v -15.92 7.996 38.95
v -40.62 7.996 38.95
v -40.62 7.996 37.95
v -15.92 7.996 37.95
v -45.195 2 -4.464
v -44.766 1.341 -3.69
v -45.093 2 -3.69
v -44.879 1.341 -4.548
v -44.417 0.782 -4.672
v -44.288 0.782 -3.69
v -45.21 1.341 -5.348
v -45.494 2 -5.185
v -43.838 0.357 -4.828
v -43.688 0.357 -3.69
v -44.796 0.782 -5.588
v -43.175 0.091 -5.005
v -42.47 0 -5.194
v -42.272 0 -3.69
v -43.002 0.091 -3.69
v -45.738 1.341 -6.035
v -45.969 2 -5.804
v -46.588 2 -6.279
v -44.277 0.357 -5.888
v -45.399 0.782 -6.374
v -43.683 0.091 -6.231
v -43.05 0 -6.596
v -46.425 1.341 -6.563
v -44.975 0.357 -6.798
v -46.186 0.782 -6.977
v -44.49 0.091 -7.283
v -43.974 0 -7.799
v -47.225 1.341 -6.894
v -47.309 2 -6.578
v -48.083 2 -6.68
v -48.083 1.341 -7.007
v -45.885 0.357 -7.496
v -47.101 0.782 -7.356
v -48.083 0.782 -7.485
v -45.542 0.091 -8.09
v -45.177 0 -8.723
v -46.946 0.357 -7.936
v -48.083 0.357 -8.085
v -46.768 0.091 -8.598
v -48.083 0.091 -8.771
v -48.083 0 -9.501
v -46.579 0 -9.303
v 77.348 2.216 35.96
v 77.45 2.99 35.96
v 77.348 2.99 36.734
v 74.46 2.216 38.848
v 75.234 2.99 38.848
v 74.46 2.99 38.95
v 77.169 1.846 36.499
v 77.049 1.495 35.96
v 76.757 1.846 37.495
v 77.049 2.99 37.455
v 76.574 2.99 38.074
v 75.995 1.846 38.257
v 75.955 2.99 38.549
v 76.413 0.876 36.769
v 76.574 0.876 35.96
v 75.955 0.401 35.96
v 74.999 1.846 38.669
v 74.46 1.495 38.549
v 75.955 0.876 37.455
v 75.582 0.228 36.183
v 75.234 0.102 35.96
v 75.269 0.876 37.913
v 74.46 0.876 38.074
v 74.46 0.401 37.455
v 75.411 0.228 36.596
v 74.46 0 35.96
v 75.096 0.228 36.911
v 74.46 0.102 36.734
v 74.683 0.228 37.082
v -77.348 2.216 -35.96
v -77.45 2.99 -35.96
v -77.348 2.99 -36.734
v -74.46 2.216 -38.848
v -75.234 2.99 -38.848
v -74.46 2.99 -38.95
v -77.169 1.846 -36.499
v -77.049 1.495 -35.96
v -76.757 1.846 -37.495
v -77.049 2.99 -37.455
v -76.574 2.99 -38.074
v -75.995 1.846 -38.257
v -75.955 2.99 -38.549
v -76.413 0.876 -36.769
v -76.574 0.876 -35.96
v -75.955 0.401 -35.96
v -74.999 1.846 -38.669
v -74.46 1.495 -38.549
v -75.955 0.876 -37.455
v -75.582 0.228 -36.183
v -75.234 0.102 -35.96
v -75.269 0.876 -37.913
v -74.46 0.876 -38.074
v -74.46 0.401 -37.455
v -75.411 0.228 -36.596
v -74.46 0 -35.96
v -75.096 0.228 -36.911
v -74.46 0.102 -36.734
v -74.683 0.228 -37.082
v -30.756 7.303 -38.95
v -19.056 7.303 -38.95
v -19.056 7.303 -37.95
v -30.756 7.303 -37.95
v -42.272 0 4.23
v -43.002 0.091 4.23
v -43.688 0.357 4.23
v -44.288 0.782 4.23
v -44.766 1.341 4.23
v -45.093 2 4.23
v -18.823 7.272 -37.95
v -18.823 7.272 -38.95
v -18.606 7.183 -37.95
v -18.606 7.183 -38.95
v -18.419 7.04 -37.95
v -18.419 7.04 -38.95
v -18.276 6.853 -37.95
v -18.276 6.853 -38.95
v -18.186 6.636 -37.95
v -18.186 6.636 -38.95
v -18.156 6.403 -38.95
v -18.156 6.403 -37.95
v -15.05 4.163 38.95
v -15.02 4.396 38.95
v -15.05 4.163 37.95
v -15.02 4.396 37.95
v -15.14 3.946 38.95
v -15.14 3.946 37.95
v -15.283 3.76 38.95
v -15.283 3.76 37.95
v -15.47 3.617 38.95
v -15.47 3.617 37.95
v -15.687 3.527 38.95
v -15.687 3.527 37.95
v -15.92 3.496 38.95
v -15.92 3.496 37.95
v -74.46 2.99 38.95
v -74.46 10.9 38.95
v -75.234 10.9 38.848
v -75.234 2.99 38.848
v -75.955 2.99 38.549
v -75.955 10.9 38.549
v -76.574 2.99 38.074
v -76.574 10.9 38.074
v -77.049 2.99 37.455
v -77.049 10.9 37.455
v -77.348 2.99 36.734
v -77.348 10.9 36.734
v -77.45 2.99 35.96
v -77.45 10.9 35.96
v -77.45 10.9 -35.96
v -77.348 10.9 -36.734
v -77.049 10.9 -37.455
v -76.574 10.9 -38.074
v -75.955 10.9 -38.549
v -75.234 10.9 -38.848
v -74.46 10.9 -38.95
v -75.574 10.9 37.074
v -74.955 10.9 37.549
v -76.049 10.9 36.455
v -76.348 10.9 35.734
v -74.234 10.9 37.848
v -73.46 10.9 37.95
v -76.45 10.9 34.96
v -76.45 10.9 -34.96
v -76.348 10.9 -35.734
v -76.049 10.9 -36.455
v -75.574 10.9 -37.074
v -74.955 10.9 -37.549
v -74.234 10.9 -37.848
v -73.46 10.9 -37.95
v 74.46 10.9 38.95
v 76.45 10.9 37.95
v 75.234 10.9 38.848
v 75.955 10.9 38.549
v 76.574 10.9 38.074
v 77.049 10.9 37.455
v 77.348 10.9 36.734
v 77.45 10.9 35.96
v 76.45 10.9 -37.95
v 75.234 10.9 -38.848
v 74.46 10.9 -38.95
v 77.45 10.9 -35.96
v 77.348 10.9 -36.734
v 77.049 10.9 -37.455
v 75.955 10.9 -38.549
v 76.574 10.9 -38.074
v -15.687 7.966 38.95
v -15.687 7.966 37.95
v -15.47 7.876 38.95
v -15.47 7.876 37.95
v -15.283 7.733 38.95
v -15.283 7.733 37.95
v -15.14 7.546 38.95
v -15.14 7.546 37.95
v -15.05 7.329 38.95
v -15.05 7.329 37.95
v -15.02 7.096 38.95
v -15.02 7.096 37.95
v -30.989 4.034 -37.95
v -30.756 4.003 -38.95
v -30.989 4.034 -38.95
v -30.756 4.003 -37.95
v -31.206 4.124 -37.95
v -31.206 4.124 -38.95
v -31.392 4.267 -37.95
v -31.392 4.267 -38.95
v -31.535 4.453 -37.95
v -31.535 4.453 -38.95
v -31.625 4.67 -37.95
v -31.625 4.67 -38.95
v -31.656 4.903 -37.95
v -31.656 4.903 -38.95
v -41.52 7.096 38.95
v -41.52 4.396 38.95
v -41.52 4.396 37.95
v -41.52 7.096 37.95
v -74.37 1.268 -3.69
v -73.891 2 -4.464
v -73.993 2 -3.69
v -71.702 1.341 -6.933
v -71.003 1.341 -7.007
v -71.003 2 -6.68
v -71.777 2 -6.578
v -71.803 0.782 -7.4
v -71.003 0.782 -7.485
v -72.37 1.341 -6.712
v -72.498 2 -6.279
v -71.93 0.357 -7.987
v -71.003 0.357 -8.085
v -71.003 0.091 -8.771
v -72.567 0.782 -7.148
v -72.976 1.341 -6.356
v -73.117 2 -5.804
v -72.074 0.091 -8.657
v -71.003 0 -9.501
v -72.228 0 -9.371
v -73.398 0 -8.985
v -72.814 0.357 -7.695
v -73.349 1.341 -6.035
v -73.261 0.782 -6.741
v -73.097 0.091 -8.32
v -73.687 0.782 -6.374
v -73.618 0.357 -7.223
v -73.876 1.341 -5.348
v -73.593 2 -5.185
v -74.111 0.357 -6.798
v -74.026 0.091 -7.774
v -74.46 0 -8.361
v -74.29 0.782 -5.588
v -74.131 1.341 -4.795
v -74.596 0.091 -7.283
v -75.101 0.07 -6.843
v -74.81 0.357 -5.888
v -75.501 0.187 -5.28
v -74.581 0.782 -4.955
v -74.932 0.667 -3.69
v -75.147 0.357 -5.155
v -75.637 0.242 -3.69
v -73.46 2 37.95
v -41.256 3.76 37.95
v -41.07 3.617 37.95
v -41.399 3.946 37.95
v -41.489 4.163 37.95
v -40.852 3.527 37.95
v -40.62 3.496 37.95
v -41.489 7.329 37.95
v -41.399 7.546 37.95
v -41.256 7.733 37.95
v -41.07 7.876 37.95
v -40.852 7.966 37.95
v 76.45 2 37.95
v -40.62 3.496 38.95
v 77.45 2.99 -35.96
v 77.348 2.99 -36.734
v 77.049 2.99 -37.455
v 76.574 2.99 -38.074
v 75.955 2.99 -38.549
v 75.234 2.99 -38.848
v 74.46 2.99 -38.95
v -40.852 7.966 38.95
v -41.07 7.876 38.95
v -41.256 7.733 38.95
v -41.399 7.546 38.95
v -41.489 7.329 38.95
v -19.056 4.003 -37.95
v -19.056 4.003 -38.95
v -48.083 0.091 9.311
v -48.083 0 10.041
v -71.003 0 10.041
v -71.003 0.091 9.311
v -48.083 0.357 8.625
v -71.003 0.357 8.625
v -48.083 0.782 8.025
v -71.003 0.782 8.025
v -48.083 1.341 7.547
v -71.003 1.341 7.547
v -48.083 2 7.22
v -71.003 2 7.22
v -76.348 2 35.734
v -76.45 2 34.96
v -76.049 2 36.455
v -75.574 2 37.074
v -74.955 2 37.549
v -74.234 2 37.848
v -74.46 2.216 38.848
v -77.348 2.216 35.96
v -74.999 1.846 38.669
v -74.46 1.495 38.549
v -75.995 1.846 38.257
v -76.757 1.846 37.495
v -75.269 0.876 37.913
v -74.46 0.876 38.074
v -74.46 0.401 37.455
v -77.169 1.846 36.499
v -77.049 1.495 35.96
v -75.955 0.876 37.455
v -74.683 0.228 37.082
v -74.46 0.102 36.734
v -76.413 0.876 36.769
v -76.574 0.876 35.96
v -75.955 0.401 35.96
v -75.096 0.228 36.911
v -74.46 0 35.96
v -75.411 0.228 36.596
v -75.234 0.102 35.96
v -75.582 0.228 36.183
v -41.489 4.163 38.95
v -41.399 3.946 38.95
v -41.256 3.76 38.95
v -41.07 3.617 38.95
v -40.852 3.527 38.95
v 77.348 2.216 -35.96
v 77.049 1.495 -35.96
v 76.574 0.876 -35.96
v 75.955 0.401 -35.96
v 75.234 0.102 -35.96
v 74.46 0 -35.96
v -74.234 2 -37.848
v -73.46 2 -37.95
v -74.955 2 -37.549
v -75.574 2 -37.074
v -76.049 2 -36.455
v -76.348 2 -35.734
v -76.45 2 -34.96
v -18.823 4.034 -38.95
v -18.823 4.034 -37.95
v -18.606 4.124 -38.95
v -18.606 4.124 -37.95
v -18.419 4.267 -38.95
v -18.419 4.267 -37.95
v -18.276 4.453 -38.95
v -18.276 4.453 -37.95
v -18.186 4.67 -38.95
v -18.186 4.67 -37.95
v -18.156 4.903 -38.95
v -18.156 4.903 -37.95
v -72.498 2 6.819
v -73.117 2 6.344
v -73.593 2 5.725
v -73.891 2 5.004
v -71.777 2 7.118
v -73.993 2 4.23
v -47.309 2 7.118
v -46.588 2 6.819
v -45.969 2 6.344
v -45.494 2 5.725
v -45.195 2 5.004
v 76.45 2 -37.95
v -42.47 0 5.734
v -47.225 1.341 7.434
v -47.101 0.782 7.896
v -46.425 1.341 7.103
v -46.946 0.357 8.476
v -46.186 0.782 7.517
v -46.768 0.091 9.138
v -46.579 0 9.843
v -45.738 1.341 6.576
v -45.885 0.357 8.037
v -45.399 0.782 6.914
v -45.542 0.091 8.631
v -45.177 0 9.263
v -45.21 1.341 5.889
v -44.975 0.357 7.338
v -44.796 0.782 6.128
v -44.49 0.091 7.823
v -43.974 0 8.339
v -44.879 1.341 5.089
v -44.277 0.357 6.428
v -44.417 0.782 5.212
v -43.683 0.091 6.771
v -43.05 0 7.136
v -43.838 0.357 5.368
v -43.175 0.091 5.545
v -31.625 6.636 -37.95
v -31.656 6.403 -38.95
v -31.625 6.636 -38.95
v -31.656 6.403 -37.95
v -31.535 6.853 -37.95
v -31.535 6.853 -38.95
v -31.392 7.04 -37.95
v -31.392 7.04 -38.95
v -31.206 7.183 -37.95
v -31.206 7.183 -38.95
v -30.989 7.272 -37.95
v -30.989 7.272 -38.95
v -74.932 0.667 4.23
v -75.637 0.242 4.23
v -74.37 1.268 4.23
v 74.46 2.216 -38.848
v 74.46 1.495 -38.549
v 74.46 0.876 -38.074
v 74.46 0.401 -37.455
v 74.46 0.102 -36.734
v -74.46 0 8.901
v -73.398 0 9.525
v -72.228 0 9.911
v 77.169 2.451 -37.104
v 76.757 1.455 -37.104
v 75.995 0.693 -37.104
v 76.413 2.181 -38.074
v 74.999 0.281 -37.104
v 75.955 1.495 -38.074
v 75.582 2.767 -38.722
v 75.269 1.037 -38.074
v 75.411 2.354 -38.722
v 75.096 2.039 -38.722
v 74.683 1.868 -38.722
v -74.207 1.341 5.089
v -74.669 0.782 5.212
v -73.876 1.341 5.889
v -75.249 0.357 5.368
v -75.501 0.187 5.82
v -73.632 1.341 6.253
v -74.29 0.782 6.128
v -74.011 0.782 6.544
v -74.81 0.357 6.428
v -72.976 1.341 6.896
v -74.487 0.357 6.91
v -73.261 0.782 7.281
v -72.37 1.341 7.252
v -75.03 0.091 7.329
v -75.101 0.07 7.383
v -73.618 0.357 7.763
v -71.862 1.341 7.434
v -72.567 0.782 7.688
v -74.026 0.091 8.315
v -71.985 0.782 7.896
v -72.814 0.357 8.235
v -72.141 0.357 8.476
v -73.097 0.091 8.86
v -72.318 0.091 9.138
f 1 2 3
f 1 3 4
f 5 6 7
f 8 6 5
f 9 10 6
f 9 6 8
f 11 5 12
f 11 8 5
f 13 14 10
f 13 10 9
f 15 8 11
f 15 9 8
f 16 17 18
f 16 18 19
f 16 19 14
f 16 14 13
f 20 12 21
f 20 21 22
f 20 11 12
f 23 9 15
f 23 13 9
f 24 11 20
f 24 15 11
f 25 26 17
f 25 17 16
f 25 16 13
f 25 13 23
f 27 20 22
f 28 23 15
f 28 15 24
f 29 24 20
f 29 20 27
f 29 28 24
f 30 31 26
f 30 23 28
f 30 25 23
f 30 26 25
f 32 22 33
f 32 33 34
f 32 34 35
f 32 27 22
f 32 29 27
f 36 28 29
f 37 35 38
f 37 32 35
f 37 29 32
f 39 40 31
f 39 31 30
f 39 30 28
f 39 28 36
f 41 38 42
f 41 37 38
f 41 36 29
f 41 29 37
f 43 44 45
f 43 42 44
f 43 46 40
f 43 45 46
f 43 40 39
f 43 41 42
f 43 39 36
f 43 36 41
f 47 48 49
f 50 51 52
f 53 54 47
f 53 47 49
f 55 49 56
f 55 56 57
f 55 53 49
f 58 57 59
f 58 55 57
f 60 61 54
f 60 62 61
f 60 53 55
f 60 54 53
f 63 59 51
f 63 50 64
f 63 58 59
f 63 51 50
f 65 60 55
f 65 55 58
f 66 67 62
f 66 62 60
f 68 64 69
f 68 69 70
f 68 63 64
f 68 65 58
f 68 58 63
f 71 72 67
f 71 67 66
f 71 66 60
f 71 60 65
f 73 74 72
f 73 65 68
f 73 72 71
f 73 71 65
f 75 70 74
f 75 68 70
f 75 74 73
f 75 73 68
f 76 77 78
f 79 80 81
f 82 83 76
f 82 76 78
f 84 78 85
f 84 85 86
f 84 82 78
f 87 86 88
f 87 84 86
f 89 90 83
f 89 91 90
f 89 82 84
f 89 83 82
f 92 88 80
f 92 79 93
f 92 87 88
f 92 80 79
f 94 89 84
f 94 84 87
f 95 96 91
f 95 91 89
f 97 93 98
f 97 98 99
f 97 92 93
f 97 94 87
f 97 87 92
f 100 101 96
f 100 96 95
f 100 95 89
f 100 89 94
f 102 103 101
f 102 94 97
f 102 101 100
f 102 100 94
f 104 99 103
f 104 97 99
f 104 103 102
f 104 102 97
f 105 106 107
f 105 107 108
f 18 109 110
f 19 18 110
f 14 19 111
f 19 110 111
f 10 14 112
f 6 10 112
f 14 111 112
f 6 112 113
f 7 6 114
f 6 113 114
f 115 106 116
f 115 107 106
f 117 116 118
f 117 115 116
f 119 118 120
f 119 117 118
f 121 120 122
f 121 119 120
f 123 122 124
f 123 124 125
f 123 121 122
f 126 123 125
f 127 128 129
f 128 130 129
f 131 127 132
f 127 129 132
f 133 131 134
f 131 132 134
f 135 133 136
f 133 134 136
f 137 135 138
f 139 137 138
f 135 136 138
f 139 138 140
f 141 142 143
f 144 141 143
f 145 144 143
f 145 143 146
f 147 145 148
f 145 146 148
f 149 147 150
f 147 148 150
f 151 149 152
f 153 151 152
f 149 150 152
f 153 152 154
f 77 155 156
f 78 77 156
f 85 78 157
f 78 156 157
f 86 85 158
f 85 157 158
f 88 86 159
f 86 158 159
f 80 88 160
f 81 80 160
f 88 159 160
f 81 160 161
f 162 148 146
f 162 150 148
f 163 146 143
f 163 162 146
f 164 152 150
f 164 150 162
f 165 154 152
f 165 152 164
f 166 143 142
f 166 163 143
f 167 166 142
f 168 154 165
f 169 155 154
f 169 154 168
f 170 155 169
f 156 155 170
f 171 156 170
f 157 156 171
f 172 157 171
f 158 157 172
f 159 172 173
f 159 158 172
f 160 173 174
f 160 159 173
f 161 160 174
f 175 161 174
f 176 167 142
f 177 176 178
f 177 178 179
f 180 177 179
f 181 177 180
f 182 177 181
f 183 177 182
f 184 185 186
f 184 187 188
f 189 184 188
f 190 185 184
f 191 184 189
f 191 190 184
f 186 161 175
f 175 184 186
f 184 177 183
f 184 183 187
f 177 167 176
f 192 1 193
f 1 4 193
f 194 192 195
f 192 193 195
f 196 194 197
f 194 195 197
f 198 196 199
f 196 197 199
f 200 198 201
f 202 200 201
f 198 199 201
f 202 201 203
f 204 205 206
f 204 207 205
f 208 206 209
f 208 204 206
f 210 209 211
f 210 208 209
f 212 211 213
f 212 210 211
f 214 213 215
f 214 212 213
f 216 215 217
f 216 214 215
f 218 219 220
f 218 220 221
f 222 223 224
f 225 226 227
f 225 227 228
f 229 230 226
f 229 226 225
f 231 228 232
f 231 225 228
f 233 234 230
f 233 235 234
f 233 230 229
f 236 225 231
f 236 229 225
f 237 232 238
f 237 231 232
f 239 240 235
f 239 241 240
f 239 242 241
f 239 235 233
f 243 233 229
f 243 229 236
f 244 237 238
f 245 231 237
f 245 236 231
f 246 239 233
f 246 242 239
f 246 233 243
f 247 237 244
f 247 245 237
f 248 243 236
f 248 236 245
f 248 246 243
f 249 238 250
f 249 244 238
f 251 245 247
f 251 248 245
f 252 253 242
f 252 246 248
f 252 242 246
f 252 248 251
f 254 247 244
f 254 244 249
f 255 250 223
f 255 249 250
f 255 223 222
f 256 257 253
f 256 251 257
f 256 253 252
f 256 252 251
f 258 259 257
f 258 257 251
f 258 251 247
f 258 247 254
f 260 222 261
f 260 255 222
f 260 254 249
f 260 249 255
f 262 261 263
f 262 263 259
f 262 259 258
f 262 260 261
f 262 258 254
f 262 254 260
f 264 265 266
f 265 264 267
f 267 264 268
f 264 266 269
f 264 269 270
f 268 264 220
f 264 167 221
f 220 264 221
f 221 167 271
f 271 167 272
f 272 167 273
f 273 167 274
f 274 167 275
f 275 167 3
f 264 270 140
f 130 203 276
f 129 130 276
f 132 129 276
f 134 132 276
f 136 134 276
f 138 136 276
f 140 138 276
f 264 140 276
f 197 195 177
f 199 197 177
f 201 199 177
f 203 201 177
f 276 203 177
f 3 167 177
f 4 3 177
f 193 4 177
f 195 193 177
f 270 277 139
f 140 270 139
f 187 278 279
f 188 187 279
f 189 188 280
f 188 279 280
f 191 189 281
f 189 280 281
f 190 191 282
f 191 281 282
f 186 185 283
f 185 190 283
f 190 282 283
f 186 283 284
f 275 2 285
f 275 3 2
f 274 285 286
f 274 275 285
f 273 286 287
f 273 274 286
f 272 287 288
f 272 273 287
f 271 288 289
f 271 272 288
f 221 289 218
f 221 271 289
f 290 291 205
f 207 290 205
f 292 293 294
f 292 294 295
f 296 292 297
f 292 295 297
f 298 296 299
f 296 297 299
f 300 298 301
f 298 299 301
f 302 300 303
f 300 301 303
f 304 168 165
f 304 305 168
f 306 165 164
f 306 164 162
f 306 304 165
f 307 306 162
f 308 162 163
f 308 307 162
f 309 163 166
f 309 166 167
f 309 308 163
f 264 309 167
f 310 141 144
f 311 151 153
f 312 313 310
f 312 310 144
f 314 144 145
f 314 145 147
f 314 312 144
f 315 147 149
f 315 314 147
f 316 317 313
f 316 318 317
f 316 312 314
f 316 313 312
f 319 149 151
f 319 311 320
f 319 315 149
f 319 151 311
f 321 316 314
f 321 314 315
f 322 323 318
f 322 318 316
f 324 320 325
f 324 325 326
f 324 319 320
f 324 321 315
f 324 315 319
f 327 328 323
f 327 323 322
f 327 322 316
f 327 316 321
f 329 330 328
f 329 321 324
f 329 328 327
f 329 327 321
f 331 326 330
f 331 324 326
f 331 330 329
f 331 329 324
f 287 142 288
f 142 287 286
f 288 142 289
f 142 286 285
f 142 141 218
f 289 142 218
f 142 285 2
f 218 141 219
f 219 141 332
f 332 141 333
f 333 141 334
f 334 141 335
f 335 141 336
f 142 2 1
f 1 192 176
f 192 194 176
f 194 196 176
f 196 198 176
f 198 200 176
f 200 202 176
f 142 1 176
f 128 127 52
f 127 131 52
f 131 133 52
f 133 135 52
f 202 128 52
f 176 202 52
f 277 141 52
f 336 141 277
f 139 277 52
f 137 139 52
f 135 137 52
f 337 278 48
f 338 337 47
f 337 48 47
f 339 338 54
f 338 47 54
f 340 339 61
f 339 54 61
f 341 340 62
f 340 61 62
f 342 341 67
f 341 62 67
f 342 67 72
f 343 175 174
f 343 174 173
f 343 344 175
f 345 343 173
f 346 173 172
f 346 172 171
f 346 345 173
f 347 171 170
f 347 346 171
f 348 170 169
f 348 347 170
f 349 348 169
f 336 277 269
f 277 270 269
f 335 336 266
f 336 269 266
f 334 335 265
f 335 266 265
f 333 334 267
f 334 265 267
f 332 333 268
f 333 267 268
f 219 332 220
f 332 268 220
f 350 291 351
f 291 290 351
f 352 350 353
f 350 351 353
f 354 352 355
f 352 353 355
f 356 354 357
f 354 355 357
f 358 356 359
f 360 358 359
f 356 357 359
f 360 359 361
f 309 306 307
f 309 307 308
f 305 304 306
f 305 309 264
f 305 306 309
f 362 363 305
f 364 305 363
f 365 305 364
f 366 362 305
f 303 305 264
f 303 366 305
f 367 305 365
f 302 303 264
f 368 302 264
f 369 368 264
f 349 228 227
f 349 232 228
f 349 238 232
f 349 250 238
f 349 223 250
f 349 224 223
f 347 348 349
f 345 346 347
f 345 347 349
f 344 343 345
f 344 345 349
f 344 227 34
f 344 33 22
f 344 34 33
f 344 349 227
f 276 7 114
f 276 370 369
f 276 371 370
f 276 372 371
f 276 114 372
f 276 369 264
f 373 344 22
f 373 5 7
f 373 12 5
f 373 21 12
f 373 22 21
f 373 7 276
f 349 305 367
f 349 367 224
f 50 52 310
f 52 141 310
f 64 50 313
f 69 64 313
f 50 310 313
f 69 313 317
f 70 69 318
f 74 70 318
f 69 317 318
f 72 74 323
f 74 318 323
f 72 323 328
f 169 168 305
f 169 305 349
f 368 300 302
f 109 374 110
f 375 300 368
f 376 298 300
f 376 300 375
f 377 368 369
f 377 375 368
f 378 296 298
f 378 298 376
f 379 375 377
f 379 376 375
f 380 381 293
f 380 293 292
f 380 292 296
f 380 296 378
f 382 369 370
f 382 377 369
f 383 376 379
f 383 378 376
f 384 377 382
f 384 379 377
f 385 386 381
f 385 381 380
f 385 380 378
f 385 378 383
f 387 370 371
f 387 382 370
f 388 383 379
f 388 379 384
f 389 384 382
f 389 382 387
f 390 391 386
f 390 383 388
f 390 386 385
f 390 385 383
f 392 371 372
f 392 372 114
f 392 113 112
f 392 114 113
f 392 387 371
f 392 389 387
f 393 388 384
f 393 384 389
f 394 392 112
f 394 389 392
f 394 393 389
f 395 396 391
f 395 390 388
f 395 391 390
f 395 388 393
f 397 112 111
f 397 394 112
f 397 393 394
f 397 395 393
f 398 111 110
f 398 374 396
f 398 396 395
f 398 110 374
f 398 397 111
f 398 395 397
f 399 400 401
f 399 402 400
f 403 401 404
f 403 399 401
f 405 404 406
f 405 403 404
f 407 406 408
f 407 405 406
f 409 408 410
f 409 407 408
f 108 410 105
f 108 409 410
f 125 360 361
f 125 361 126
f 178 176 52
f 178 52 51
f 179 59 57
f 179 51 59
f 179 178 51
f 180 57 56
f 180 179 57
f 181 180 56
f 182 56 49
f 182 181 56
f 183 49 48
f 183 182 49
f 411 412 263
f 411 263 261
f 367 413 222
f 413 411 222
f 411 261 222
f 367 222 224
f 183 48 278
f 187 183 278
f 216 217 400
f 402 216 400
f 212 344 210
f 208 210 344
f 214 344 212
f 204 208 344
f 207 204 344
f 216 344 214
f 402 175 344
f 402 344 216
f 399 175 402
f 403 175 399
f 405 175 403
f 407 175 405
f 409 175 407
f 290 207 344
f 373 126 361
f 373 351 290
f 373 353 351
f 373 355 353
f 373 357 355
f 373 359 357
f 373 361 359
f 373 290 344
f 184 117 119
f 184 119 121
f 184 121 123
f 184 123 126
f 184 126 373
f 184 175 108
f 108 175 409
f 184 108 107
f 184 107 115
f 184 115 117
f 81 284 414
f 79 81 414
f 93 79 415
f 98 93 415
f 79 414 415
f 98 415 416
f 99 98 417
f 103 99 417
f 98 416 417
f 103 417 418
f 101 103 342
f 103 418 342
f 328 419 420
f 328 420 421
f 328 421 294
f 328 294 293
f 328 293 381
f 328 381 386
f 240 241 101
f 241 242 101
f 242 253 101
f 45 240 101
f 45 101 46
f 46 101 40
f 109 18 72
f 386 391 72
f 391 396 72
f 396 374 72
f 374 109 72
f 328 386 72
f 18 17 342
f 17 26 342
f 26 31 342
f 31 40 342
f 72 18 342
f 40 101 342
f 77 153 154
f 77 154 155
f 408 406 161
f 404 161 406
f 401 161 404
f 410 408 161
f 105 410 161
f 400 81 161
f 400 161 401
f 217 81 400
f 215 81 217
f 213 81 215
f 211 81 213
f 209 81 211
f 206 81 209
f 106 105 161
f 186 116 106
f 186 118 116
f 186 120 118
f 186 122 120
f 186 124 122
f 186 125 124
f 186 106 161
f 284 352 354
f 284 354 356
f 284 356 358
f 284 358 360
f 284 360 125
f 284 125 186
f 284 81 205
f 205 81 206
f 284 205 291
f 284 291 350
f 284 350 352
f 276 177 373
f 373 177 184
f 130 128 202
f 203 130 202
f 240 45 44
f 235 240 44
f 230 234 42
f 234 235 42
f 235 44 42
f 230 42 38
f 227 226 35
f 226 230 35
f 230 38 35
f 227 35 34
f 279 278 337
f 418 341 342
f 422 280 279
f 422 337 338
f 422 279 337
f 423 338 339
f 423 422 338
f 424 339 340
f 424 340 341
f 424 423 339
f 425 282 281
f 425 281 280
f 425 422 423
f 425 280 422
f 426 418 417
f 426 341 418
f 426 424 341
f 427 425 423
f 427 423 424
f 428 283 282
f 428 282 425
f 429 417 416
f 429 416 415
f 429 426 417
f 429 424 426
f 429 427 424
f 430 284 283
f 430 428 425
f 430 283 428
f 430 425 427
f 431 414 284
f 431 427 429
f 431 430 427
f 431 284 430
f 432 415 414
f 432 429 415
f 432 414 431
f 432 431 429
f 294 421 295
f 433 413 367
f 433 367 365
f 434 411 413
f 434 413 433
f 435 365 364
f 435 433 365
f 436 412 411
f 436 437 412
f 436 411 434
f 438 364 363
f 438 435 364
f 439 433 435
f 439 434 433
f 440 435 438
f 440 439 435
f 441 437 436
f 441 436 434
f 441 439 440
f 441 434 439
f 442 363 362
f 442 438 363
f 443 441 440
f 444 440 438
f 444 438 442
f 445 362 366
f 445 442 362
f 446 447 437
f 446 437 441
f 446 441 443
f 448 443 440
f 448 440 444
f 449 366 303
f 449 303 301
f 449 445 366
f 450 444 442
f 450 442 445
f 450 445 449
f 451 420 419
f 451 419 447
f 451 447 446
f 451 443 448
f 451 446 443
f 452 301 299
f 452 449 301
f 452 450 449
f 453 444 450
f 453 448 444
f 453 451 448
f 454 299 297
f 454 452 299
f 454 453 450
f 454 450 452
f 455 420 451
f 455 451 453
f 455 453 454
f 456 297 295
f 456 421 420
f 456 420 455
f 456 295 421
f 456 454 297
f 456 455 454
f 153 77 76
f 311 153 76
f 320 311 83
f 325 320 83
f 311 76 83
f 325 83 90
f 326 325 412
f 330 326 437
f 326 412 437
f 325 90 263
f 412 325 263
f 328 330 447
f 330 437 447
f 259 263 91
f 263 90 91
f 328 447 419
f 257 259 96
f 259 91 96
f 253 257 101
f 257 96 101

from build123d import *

# Parameters (mm, degrees)
SKETCH1_W           = 154.9
SKETCH1_H           = 77.9
BOSS_EXTRUDE1_DEPTH = 10.9
SKETCH8_W           = 152.9
SKETCH8_H           = 75.9
CUT_EXTRUDE3_DEPTH  = 8.9
FILLET6_R           = 2.99
FILLET7_R           = 2.99
FILLET8_R           = 2.99
FILLET9_R           = 2.99
FILLET10_R          = 2.99
FILLET11_R          = 2.99
FILLET12_R          = 2.99
FILLET13_R          = 2.99
SKETCH12_W          = 28.9
SKETCH12_H          = 13.9
CUT_EXTRUDE4_DEPTH  = 88.148235782
FILLET15_R          = 2.99
FILLET16_R          = 2.99
FILLET17_R          = 2.99
FILLET18_R          = 2.99
CUT_EXTRUDE8_REACH  = 112.389
SKETCH15_W          = 26.5
SKETCH15_H          = 4.5
CUT_EXTRUDE9_REACH  = 112.389
SKETCH16_W          = 13.5
SKETCH16_H          = 3.3
FILLET19_R          = 2.99
FILLET22_R          = 0.9
FILLET23_R          = 0.9
FILLET24_R          = 0.9
FILLET25_R          = 0.9
FILLET29_R          = 0.9
FILLET39_R          = 2.99
SKETCH6_W           = 152.9
SKETCH6_H           = 75.9
CUT_EXTRUDE2_DEPTH  = 8.9
FILLET4_R           = 2.99
FILLET5_R           = 2.99


with BuildPart() as part:
    # Sketch1 → Boss-Extrude1 (new body)
    with BuildSketch(Plane(origin=(0, 0, 0), x_dir=(1, 0, 0), z_dir=(0, 1, 0))):
        Rectangle(SKETCH1_W, SKETCH1_H)
    extrude(amount=BOSS_EXTRUDE1_DEPTH)

    # Sketch8 → Cut-Extrude3 (cut)
    with BuildSketch(Plane(origin=(0, 10.9, 0), x_dir=(1, 0, 0), z_dir=(0, 1, 0))):
        Rectangle(SKETCH8_W, SKETCH8_H)
    extrude(amount=-CUT_EXTRUDE3_DEPTH, mode=Mode.SUBTRACT)

    # Fillet6
    fillet6_edges = [part.edges().sort_by_distance(p)[0] for p in [
        (-76.45, 6.45, -37.95),
    ]]
    fillet(fillet6_edges, radius=FILLET6_R)

    # Fillet7
    fillet7_edges = [part.edges().sort_by_distance(p)[0] for p in [
        (-76.45, 6.45, 37.95),
    ]]
    fillet(fillet7_edges, radius=FILLET7_R)

    # Fillet8
    fillet8_edges = [part.edges().sort_by_distance(p)[0] for p in [
        (76.45, 6.45, -37.95),
    ]]
    fillet(fillet8_edges, radius=FILLET8_R)

    # Fillet9
    fillet9_edges = [part.edges().sort_by_distance(p)[0] for p in [
        (76.45, 6.45, 37.95),
    ]]
    fillet(fillet9_edges, radius=FILLET9_R)

    # Fillet10
    fillet10_edges = [part.edges().sort_by_distance(p)[0] for p in [
        (77.45, 5.45, 38.95),
    ]]
    fillet(fillet10_edges, radius=FILLET10_R)

    # Fillet11
    fillet11_edges = [part.edges().sort_by_distance(p)[0] for p in [
        (-77.45, 5.45, 38.95),
    ]]
    fillet(fillet11_edges, radius=FILLET11_R)

    # Fillet12
    fillet12_edges = [part.edges().sort_by_distance(p)[0] for p in [
        (-77.45, 5.45, -38.95),
    ]]
    fillet(fillet12_edges, radius=FILLET12_R)

    # Fillet13
    fillet13_edges = [part.edges().sort_by_distance(p)[0] for p in [
        (1.495, 0, -38.95),
        (77.45, 0, -1.495),
        (76.574249276, 0, 38.074249276),
        (0, 0, 38.95),
        (-76.574249276, 0, 38.074249276),
        (-77.45, 0, 0),
        (-76.574249276, 0, -38.074249276),
    ]]
    fillet(fillet13_edges, radius=FILLET13_R)

    # Sketch12 → Cut-Extrude4 (cut, through all)
    with BuildSketch(Plane(origin=(0, 2, 0), x_dir=(1, 0, 0), z_dir=(0, 1, 0))):
        with Locations((-59.543133303, -0.270064355)):
            Rectangle(SKETCH12_W, SKETCH12_H)
    extrude(amount=-CUT_EXTRUDE4_DEPTH, mode=Mode.SUBTRACT)

    # Fillet15
    fillet15_edges = [part.edges().sort_by_distance(p)[0] for p in [
        (-73.993133303, 1, -6.679935645),
    ]]
    fillet(fillet15_edges, radius=FILLET15_R)

    # Fillet16
    fillet16_edges = [part.edges().sort_by_distance(p)[0] for p in [
        (-73.993133303, 1, 7.220064355),
    ]]
    fillet(fillet16_edges, radius=FILLET16_R)

    # Fillet17
    fillet17_edges = [part.edges().sort_by_distance(p)[0] for p in [
        (-45.093133303, 1, 7.220064355),
    ]]
    fillet(fillet17_edges, radius=FILLET17_R)

    # Fillet18
    fillet18_edges = [part.edges().sort_by_distance(p)[0] for p in [
        (-45.093133303, 1, -6.679935645),
    ]]
    fillet(fillet18_edges, radius=FILLET18_R)

    # Sketch15 → Cut-Extrude8 (cut, up to next)
    with BuildSketch(Plane.XY.offset(38.95), mode=Mode.PRIVATE) as cut_extrude8_sk1:
        with Locations((-28.269520984, 5.746289853)):
            Rectangle(SKETCH15_W, SKETCH15_H)
    cut_extrude8_tool1 = extrude(cut_extrude8_sk1.sketch, amount=-CUT_EXTRUDE8_REACH, mode=Mode.PRIVATE) & part.part
    add(cut_extrude8_tool1.solids().sort_by_distance((-28.269521, 5.74629, 38.95))[0], mode=Mode.SUBTRACT)

    # Sketch16 → Cut-Extrude9 (cut, up to next)
    with BuildSketch(Plane(origin=(0, 0, -38.95), x_dir=(-1, 0, 0), z_dir=(0, 0, -1)), mode=Mode.PRIVATE) as cut_extrude9_sk1:
        with Locations((24.905722524, 5.653111576)):
            Rectangle(SKETCH16_W, SKETCH16_H)
    cut_extrude9_tool1 = extrude(cut_extrude9_sk1.sketch, amount=-CUT_EXTRUDE9_REACH, mode=Mode.PRIVATE) & part.part
    add(cut_extrude9_tool1.solids().sort_by_distance((-24.905723, 5.653112, -38.95))[0], mode=Mode.SUBTRACT)

    # Fillet19
    # the kernel refuses this fillet: 2.99 mm, written as the material it takes off along each edge
    with BuildSketch(Plane(origin=(-71.003133303, 0, 4.230064355), x_dir=(-1, 0, 0), z_dir=(0, 0, -1))) as fillet19_piece_1:
        with BuildLine():
            CenterArc((5.811347196, 2.99), FILLET19_R, 199.335777997, 70.664222003)
            Line((2.99, 2), (2.933573056, 1.9802))
            ThreePointArc((2.933573056, 1.9802), (2.9302, 1), (2.9302, 0))
            Line((2.9302, 0), (2.99, -0.0598))
            Line((2.99, -0.0598), (5.811347196, -0.0598))
            Line((5.811347196, -0.0598), (5.811347196, 0))
        make_face()
    revolve(axis=Axis((-71.003133303, 0, 4.230064355), (0, 1, 0)), revolution_arc=90, mode=Mode.SUBTRACT)
    with BuildSketch(Plane(origin=(-73.993133303, 0, -3.689935645), x_dir=(-1, 0, 0), z_dir=(0, 0, 1)), Plane(origin=(-45.093133303, 0, 4.230064355), x_dir=(1, 0, 0), z_dir=(0, 0, -1))) as fillet19_piece_2:
        with BuildLine():
            CenterArc((2.821347196, -2.99), FILLET19_R, 90, 70.664222003)
            Line((0, -2), (-0.056426944, -1.9802))
            ThreePointArc((-0.056426944, -1.9802), (-0.0598, -1), (-0.0598, 0))
            Line((-0.0598, 0), (0, 0.0598))
            Line((0, 0.0598), (2.821347196, 0.0598))
            Line((2.821347196, 0.0598), (2.821347196, 0))
        make_face()
    extrude(amount=7.92, mode=Mode.SUBTRACT)
    with BuildSketch(Plane(origin=(-71.003133303, 0, -3.689935645), x_dir=(0, 0, -1), z_dir=(1, 0, 0))) as fillet19_piece_3:
        with BuildLine():
            CenterArc((5.811347196, 2.99), FILLET19_R, 199.335777997, 70.664222003)
            Line((2.99, 2), (2.933573056, 1.9802))
            ThreePointArc((2.933573056, 1.9802), (2.9302, 1), (2.9302, 0))
            Line((2.9302, 0), (2.99, -0.0598))
            Line((2.99, -0.0598), (5.811347196, -0.0598))
            Line((5.811347196, -0.0598), (5.811347196, 0))
        make_face()
    revolve(axis=Axis((-71.003133303, 0, -3.689935645), (0, 1, 0)), revolution_arc=90, mode=Mode.SUBTRACT)
    with BuildSketch(Plane(origin=(-48.083133303, 0, -6.679935645), x_dir=(0, 0, -1), z_dir=(-1, 0, 0)), Plane(origin=(-71.003133303, 0, 7.220064355), x_dir=(0, 0, 1), z_dir=(1, 0, 0))) as fillet19_piece_4:
        with BuildLine():
            CenterArc((2.821347196, -2.99), FILLET19_R, 90, 70.664222003)
            Line((0, -2), (-0.056426944, -1.9802))
            ThreePointArc((-0.056426944, -1.9802), (-0.0598, -1), (-0.0598, 0))
            Line((-0.0598, 0), (0, 0.0598))
            Line((0, 0.0598), (2.821347196, 0.0598))
            Line((2.821347196, 0.0598), (2.821347196, 0))
        make_face()
    extrude(amount=22.92, mode=Mode.SUBTRACT)
    with BuildSketch(Plane(origin=(-48.083133303, 0, -3.689935645), x_dir=(1, 0, 0), z_dir=(0, 0, 1))) as fillet19_piece_5:
        with BuildLine():
            CenterArc((5.811347196, 2.99), FILLET19_R, 199.335777997, 70.664222003)
            Line((2.99, 2), (2.933573056, 1.9802))
            ThreePointArc((2.933573056, 1.9802), (2.9302, 1), (2.9302, 0))
            Line((2.9302, 0), (2.99, -0.0598))
            Line((2.99, -0.0598), (5.811347196, -0.0598))
            Line((5.811347196, -0.0598), (5.811347196, 0))
        make_face()
    revolve(axis=Axis((-48.083133303, 0, -3.689935645), (0, 1, 0)), revolution_arc=90, mode=Mode.SUBTRACT)
    with BuildSketch(Plane(origin=(-48.083133303, 0, 4.230064355), x_dir=(0, 0, 1), z_dir=(-1, 0, 0))) as fillet19_piece_6:
        with BuildLine():
            CenterArc((5.811347196, 2.99), FILLET19_R, 199.335777997, 70.664222003)
            Line((2.99, 2), (2.933573056, 1.9802))
            ThreePointArc((2.933573056, 1.9802), (2.9302, 1), (2.9302, 0))
            Line((2.9302, 0), (2.99, -0.0598))
            Line((2.99, -0.0598), (5.811347196, -0.0598))
            Line((5.811347196, -0.0598), (5.811347196, 0))
        make_face()
    revolve(axis=Axis((-48.083133303, 0, 4.230064355), (0, 1, 0)), revolution_arc=90, mode=Mode.SUBTRACT)

    # Fillet22
    fillet22_edges = [part.edges().sort_by_distance(p)[0] for p in [
        (-15.019520984, 7.996289853, 38.45),
    ]]
    fillet(fillet22_edges, radius=FILLET22_R)

    # Fillet23
    fillet23_edges = [part.edges().sort_by_distance(p)[0] for p in [
        (-41.519520984, 7.996289853, 38.45),
    ]]
    fillet(fillet23_edges, radius=FILLET23_R)

    # Fillet24
    fillet24_edges = [part.edges().sort_by_distance(p)[0] for p in [
        (-15.019520984, 3.496289853, 38.45),
    ]]
    fillet(fillet24_edges, radius=FILLET24_R)

    # Fillet25
    fillet25_edges = [part.edges().sort_by_distance(p)[0] for p in [
        (-41.519520984, 3.496289853, 38.45),
    ]]
    fillet(fillet25_edges, radius=FILLET25_R)

    # Fillet29
    fillet29_edges = [part.edges().sort_by_distance(p)[0] for p in [
        (-31.655722524, 7.303111576, -38.45),
        (-31.655722524, 4.003111576, -38.45),
        (-18.155722524, 4.003111576, -38.45),
        (-18.155722524, 7.303111576, -38.45),
    ]]
    fillet(fillet29_edges, radius=FILLET29_R)

    # Fillet39
    # the kernel refuses this fillet: 2.99 mm, written as the material it takes off along each edge
    with BuildSketch(Plane(origin=(74.46, 2.99, -35.96), x_dir=(1, 0, 0), z_dir=(0, 0, -1))) as fillet39_piece_1_section:
        Polygon((0, 0), (FILLET39_R, 0), (FILLET39_R, FILLET39_R), (0, FILLET39_R), align=None)
    fillet39_piece_1 = extrude(amount=FILLET39_R, mode=Mode.PRIVATE)
    fillet39_piece_1 = fillet39_piece_1 - Plane(origin=(74.46, 2.99, -35.96), x_dir=(-0.7071067811865475, 0.7071067811865475, 0), z_dir=(0, 0, -1)) * Sphere(FILLET39_R, mode=Mode.PRIVATE)
    add(fillet39_piece_1, mode=Mode.SUBTRACT)
    with BuildSketch(Plane(origin=(77.45, 2.99, -38.95), x_dir=(-1, 0, 0), z_dir=(0, 1, 0))) as fillet39_piece_2:
        with BuildLine():
            CenterArc((FILLET39_R, FILLET39_R), FILLET39_R, 180, 90)
            Line((0, FILLET39_R), (0, 0))
            Line((0, 0), (FILLET39_R, 0))
        make_face()
    extrude(amount=15.385, mode=Mode.SUBTRACT)

    # Sketch6 → Cut-Extrude2 (cut)
    with BuildSketch(Plane(origin=(0, 10.9, 0), x_dir=(1, 0, 0), z_dir=(0, 1, 0))):
        Rectangle(SKETCH6_W, SKETCH6_H)
    extrude(amount=-CUT_EXTRUDE2_DEPTH, mode=Mode.SUBTRACT)

    # Fillet4
    fillet4_edges = [part.edges().sort_by_distance(p)[0] for p in [
        (-76.45, 6.45, -37.95),
    ]]
    fillet(fillet4_edges, radius=FILLET4_R)

    # Fillet5
    fillet5_edges = [part.edges().sort_by_distance(p)[0] for p in [
        (-76.45, 6.45, 37.95),
    ]]
    fillet(fillet5_edges, radius=FILLET5_R)


solid = part.part
